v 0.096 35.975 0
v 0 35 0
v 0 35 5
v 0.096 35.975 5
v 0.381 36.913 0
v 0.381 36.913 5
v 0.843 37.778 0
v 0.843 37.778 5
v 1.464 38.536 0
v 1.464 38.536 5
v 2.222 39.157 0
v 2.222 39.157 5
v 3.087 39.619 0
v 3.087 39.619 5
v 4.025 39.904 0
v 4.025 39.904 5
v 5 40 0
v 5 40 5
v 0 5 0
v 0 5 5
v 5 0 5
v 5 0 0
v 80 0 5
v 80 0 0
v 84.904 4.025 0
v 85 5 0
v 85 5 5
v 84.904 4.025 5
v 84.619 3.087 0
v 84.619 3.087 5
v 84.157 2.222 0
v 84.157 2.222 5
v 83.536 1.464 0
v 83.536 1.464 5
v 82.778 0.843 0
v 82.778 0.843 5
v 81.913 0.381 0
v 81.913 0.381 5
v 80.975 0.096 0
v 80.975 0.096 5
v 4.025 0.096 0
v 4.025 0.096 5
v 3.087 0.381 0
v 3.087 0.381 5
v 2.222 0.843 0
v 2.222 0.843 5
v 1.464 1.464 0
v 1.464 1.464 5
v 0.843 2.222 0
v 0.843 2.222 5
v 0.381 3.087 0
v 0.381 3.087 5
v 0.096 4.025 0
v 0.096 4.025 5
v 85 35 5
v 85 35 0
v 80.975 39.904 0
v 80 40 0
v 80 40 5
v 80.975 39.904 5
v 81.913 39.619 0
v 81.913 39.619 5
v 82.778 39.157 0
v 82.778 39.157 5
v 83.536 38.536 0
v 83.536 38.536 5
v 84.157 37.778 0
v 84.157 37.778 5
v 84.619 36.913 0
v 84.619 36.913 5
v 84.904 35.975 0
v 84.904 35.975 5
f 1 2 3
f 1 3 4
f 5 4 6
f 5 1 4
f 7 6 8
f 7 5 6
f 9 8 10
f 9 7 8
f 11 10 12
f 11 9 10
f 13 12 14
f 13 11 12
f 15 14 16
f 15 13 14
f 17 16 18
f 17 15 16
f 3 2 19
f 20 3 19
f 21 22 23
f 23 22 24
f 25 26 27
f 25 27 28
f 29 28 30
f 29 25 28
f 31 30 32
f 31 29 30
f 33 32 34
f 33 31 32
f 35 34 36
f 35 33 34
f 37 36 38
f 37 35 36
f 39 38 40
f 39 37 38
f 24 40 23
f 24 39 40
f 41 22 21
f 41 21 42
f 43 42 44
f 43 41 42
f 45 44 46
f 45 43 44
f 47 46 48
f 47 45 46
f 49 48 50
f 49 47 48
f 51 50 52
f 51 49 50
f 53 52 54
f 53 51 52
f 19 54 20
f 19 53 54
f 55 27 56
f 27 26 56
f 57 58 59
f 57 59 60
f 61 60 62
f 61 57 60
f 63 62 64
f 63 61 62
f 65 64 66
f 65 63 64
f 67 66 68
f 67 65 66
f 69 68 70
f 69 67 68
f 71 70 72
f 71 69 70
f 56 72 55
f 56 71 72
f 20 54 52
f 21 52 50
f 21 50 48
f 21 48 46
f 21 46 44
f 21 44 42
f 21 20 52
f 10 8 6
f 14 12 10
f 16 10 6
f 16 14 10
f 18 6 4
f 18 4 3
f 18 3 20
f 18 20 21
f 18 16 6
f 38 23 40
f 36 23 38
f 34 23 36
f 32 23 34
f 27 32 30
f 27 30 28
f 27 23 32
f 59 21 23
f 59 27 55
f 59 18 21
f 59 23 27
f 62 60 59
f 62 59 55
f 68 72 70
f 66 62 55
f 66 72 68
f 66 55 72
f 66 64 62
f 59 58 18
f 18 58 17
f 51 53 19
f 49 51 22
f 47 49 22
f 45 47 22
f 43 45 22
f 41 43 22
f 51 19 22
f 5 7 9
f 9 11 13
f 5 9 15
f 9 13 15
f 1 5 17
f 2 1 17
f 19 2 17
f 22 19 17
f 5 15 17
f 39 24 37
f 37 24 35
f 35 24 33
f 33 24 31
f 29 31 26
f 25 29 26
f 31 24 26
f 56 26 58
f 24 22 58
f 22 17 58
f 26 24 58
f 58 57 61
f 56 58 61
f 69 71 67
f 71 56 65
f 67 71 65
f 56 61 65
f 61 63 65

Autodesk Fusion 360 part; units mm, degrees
sketch "Sketch1" plane through (0, 0, 0) normal (0, 0, 1) x (1, 0, 0)
  line L0 (5, 0) -> (80, 0)
  line L1 (85, 5) -> (85, 35)
  line L2 (80, 40) -> (5, 40)
  line L3 (0, 35) -> (0, 5)
  arc A0 (5, 40) -> (0, 35) centre (5, 35) ccw
  arc A1 (0, 5) -> (5, 0) centre (5, 5) ccw
  arc A2 (80, 0) -> (85, 5) centre (80, 5) ccw
  arc A3 (85, 35) -> (80, 40) centre (80, 35) ccw
  point P0 (85, 0)
  point P1 (0, 40)
  dimension "d1" = 85
  dimension "d2" = 40
  dimension "d3" = 5
extrude "Extrude1" add sketch "Sketch1" along normal blind 5
